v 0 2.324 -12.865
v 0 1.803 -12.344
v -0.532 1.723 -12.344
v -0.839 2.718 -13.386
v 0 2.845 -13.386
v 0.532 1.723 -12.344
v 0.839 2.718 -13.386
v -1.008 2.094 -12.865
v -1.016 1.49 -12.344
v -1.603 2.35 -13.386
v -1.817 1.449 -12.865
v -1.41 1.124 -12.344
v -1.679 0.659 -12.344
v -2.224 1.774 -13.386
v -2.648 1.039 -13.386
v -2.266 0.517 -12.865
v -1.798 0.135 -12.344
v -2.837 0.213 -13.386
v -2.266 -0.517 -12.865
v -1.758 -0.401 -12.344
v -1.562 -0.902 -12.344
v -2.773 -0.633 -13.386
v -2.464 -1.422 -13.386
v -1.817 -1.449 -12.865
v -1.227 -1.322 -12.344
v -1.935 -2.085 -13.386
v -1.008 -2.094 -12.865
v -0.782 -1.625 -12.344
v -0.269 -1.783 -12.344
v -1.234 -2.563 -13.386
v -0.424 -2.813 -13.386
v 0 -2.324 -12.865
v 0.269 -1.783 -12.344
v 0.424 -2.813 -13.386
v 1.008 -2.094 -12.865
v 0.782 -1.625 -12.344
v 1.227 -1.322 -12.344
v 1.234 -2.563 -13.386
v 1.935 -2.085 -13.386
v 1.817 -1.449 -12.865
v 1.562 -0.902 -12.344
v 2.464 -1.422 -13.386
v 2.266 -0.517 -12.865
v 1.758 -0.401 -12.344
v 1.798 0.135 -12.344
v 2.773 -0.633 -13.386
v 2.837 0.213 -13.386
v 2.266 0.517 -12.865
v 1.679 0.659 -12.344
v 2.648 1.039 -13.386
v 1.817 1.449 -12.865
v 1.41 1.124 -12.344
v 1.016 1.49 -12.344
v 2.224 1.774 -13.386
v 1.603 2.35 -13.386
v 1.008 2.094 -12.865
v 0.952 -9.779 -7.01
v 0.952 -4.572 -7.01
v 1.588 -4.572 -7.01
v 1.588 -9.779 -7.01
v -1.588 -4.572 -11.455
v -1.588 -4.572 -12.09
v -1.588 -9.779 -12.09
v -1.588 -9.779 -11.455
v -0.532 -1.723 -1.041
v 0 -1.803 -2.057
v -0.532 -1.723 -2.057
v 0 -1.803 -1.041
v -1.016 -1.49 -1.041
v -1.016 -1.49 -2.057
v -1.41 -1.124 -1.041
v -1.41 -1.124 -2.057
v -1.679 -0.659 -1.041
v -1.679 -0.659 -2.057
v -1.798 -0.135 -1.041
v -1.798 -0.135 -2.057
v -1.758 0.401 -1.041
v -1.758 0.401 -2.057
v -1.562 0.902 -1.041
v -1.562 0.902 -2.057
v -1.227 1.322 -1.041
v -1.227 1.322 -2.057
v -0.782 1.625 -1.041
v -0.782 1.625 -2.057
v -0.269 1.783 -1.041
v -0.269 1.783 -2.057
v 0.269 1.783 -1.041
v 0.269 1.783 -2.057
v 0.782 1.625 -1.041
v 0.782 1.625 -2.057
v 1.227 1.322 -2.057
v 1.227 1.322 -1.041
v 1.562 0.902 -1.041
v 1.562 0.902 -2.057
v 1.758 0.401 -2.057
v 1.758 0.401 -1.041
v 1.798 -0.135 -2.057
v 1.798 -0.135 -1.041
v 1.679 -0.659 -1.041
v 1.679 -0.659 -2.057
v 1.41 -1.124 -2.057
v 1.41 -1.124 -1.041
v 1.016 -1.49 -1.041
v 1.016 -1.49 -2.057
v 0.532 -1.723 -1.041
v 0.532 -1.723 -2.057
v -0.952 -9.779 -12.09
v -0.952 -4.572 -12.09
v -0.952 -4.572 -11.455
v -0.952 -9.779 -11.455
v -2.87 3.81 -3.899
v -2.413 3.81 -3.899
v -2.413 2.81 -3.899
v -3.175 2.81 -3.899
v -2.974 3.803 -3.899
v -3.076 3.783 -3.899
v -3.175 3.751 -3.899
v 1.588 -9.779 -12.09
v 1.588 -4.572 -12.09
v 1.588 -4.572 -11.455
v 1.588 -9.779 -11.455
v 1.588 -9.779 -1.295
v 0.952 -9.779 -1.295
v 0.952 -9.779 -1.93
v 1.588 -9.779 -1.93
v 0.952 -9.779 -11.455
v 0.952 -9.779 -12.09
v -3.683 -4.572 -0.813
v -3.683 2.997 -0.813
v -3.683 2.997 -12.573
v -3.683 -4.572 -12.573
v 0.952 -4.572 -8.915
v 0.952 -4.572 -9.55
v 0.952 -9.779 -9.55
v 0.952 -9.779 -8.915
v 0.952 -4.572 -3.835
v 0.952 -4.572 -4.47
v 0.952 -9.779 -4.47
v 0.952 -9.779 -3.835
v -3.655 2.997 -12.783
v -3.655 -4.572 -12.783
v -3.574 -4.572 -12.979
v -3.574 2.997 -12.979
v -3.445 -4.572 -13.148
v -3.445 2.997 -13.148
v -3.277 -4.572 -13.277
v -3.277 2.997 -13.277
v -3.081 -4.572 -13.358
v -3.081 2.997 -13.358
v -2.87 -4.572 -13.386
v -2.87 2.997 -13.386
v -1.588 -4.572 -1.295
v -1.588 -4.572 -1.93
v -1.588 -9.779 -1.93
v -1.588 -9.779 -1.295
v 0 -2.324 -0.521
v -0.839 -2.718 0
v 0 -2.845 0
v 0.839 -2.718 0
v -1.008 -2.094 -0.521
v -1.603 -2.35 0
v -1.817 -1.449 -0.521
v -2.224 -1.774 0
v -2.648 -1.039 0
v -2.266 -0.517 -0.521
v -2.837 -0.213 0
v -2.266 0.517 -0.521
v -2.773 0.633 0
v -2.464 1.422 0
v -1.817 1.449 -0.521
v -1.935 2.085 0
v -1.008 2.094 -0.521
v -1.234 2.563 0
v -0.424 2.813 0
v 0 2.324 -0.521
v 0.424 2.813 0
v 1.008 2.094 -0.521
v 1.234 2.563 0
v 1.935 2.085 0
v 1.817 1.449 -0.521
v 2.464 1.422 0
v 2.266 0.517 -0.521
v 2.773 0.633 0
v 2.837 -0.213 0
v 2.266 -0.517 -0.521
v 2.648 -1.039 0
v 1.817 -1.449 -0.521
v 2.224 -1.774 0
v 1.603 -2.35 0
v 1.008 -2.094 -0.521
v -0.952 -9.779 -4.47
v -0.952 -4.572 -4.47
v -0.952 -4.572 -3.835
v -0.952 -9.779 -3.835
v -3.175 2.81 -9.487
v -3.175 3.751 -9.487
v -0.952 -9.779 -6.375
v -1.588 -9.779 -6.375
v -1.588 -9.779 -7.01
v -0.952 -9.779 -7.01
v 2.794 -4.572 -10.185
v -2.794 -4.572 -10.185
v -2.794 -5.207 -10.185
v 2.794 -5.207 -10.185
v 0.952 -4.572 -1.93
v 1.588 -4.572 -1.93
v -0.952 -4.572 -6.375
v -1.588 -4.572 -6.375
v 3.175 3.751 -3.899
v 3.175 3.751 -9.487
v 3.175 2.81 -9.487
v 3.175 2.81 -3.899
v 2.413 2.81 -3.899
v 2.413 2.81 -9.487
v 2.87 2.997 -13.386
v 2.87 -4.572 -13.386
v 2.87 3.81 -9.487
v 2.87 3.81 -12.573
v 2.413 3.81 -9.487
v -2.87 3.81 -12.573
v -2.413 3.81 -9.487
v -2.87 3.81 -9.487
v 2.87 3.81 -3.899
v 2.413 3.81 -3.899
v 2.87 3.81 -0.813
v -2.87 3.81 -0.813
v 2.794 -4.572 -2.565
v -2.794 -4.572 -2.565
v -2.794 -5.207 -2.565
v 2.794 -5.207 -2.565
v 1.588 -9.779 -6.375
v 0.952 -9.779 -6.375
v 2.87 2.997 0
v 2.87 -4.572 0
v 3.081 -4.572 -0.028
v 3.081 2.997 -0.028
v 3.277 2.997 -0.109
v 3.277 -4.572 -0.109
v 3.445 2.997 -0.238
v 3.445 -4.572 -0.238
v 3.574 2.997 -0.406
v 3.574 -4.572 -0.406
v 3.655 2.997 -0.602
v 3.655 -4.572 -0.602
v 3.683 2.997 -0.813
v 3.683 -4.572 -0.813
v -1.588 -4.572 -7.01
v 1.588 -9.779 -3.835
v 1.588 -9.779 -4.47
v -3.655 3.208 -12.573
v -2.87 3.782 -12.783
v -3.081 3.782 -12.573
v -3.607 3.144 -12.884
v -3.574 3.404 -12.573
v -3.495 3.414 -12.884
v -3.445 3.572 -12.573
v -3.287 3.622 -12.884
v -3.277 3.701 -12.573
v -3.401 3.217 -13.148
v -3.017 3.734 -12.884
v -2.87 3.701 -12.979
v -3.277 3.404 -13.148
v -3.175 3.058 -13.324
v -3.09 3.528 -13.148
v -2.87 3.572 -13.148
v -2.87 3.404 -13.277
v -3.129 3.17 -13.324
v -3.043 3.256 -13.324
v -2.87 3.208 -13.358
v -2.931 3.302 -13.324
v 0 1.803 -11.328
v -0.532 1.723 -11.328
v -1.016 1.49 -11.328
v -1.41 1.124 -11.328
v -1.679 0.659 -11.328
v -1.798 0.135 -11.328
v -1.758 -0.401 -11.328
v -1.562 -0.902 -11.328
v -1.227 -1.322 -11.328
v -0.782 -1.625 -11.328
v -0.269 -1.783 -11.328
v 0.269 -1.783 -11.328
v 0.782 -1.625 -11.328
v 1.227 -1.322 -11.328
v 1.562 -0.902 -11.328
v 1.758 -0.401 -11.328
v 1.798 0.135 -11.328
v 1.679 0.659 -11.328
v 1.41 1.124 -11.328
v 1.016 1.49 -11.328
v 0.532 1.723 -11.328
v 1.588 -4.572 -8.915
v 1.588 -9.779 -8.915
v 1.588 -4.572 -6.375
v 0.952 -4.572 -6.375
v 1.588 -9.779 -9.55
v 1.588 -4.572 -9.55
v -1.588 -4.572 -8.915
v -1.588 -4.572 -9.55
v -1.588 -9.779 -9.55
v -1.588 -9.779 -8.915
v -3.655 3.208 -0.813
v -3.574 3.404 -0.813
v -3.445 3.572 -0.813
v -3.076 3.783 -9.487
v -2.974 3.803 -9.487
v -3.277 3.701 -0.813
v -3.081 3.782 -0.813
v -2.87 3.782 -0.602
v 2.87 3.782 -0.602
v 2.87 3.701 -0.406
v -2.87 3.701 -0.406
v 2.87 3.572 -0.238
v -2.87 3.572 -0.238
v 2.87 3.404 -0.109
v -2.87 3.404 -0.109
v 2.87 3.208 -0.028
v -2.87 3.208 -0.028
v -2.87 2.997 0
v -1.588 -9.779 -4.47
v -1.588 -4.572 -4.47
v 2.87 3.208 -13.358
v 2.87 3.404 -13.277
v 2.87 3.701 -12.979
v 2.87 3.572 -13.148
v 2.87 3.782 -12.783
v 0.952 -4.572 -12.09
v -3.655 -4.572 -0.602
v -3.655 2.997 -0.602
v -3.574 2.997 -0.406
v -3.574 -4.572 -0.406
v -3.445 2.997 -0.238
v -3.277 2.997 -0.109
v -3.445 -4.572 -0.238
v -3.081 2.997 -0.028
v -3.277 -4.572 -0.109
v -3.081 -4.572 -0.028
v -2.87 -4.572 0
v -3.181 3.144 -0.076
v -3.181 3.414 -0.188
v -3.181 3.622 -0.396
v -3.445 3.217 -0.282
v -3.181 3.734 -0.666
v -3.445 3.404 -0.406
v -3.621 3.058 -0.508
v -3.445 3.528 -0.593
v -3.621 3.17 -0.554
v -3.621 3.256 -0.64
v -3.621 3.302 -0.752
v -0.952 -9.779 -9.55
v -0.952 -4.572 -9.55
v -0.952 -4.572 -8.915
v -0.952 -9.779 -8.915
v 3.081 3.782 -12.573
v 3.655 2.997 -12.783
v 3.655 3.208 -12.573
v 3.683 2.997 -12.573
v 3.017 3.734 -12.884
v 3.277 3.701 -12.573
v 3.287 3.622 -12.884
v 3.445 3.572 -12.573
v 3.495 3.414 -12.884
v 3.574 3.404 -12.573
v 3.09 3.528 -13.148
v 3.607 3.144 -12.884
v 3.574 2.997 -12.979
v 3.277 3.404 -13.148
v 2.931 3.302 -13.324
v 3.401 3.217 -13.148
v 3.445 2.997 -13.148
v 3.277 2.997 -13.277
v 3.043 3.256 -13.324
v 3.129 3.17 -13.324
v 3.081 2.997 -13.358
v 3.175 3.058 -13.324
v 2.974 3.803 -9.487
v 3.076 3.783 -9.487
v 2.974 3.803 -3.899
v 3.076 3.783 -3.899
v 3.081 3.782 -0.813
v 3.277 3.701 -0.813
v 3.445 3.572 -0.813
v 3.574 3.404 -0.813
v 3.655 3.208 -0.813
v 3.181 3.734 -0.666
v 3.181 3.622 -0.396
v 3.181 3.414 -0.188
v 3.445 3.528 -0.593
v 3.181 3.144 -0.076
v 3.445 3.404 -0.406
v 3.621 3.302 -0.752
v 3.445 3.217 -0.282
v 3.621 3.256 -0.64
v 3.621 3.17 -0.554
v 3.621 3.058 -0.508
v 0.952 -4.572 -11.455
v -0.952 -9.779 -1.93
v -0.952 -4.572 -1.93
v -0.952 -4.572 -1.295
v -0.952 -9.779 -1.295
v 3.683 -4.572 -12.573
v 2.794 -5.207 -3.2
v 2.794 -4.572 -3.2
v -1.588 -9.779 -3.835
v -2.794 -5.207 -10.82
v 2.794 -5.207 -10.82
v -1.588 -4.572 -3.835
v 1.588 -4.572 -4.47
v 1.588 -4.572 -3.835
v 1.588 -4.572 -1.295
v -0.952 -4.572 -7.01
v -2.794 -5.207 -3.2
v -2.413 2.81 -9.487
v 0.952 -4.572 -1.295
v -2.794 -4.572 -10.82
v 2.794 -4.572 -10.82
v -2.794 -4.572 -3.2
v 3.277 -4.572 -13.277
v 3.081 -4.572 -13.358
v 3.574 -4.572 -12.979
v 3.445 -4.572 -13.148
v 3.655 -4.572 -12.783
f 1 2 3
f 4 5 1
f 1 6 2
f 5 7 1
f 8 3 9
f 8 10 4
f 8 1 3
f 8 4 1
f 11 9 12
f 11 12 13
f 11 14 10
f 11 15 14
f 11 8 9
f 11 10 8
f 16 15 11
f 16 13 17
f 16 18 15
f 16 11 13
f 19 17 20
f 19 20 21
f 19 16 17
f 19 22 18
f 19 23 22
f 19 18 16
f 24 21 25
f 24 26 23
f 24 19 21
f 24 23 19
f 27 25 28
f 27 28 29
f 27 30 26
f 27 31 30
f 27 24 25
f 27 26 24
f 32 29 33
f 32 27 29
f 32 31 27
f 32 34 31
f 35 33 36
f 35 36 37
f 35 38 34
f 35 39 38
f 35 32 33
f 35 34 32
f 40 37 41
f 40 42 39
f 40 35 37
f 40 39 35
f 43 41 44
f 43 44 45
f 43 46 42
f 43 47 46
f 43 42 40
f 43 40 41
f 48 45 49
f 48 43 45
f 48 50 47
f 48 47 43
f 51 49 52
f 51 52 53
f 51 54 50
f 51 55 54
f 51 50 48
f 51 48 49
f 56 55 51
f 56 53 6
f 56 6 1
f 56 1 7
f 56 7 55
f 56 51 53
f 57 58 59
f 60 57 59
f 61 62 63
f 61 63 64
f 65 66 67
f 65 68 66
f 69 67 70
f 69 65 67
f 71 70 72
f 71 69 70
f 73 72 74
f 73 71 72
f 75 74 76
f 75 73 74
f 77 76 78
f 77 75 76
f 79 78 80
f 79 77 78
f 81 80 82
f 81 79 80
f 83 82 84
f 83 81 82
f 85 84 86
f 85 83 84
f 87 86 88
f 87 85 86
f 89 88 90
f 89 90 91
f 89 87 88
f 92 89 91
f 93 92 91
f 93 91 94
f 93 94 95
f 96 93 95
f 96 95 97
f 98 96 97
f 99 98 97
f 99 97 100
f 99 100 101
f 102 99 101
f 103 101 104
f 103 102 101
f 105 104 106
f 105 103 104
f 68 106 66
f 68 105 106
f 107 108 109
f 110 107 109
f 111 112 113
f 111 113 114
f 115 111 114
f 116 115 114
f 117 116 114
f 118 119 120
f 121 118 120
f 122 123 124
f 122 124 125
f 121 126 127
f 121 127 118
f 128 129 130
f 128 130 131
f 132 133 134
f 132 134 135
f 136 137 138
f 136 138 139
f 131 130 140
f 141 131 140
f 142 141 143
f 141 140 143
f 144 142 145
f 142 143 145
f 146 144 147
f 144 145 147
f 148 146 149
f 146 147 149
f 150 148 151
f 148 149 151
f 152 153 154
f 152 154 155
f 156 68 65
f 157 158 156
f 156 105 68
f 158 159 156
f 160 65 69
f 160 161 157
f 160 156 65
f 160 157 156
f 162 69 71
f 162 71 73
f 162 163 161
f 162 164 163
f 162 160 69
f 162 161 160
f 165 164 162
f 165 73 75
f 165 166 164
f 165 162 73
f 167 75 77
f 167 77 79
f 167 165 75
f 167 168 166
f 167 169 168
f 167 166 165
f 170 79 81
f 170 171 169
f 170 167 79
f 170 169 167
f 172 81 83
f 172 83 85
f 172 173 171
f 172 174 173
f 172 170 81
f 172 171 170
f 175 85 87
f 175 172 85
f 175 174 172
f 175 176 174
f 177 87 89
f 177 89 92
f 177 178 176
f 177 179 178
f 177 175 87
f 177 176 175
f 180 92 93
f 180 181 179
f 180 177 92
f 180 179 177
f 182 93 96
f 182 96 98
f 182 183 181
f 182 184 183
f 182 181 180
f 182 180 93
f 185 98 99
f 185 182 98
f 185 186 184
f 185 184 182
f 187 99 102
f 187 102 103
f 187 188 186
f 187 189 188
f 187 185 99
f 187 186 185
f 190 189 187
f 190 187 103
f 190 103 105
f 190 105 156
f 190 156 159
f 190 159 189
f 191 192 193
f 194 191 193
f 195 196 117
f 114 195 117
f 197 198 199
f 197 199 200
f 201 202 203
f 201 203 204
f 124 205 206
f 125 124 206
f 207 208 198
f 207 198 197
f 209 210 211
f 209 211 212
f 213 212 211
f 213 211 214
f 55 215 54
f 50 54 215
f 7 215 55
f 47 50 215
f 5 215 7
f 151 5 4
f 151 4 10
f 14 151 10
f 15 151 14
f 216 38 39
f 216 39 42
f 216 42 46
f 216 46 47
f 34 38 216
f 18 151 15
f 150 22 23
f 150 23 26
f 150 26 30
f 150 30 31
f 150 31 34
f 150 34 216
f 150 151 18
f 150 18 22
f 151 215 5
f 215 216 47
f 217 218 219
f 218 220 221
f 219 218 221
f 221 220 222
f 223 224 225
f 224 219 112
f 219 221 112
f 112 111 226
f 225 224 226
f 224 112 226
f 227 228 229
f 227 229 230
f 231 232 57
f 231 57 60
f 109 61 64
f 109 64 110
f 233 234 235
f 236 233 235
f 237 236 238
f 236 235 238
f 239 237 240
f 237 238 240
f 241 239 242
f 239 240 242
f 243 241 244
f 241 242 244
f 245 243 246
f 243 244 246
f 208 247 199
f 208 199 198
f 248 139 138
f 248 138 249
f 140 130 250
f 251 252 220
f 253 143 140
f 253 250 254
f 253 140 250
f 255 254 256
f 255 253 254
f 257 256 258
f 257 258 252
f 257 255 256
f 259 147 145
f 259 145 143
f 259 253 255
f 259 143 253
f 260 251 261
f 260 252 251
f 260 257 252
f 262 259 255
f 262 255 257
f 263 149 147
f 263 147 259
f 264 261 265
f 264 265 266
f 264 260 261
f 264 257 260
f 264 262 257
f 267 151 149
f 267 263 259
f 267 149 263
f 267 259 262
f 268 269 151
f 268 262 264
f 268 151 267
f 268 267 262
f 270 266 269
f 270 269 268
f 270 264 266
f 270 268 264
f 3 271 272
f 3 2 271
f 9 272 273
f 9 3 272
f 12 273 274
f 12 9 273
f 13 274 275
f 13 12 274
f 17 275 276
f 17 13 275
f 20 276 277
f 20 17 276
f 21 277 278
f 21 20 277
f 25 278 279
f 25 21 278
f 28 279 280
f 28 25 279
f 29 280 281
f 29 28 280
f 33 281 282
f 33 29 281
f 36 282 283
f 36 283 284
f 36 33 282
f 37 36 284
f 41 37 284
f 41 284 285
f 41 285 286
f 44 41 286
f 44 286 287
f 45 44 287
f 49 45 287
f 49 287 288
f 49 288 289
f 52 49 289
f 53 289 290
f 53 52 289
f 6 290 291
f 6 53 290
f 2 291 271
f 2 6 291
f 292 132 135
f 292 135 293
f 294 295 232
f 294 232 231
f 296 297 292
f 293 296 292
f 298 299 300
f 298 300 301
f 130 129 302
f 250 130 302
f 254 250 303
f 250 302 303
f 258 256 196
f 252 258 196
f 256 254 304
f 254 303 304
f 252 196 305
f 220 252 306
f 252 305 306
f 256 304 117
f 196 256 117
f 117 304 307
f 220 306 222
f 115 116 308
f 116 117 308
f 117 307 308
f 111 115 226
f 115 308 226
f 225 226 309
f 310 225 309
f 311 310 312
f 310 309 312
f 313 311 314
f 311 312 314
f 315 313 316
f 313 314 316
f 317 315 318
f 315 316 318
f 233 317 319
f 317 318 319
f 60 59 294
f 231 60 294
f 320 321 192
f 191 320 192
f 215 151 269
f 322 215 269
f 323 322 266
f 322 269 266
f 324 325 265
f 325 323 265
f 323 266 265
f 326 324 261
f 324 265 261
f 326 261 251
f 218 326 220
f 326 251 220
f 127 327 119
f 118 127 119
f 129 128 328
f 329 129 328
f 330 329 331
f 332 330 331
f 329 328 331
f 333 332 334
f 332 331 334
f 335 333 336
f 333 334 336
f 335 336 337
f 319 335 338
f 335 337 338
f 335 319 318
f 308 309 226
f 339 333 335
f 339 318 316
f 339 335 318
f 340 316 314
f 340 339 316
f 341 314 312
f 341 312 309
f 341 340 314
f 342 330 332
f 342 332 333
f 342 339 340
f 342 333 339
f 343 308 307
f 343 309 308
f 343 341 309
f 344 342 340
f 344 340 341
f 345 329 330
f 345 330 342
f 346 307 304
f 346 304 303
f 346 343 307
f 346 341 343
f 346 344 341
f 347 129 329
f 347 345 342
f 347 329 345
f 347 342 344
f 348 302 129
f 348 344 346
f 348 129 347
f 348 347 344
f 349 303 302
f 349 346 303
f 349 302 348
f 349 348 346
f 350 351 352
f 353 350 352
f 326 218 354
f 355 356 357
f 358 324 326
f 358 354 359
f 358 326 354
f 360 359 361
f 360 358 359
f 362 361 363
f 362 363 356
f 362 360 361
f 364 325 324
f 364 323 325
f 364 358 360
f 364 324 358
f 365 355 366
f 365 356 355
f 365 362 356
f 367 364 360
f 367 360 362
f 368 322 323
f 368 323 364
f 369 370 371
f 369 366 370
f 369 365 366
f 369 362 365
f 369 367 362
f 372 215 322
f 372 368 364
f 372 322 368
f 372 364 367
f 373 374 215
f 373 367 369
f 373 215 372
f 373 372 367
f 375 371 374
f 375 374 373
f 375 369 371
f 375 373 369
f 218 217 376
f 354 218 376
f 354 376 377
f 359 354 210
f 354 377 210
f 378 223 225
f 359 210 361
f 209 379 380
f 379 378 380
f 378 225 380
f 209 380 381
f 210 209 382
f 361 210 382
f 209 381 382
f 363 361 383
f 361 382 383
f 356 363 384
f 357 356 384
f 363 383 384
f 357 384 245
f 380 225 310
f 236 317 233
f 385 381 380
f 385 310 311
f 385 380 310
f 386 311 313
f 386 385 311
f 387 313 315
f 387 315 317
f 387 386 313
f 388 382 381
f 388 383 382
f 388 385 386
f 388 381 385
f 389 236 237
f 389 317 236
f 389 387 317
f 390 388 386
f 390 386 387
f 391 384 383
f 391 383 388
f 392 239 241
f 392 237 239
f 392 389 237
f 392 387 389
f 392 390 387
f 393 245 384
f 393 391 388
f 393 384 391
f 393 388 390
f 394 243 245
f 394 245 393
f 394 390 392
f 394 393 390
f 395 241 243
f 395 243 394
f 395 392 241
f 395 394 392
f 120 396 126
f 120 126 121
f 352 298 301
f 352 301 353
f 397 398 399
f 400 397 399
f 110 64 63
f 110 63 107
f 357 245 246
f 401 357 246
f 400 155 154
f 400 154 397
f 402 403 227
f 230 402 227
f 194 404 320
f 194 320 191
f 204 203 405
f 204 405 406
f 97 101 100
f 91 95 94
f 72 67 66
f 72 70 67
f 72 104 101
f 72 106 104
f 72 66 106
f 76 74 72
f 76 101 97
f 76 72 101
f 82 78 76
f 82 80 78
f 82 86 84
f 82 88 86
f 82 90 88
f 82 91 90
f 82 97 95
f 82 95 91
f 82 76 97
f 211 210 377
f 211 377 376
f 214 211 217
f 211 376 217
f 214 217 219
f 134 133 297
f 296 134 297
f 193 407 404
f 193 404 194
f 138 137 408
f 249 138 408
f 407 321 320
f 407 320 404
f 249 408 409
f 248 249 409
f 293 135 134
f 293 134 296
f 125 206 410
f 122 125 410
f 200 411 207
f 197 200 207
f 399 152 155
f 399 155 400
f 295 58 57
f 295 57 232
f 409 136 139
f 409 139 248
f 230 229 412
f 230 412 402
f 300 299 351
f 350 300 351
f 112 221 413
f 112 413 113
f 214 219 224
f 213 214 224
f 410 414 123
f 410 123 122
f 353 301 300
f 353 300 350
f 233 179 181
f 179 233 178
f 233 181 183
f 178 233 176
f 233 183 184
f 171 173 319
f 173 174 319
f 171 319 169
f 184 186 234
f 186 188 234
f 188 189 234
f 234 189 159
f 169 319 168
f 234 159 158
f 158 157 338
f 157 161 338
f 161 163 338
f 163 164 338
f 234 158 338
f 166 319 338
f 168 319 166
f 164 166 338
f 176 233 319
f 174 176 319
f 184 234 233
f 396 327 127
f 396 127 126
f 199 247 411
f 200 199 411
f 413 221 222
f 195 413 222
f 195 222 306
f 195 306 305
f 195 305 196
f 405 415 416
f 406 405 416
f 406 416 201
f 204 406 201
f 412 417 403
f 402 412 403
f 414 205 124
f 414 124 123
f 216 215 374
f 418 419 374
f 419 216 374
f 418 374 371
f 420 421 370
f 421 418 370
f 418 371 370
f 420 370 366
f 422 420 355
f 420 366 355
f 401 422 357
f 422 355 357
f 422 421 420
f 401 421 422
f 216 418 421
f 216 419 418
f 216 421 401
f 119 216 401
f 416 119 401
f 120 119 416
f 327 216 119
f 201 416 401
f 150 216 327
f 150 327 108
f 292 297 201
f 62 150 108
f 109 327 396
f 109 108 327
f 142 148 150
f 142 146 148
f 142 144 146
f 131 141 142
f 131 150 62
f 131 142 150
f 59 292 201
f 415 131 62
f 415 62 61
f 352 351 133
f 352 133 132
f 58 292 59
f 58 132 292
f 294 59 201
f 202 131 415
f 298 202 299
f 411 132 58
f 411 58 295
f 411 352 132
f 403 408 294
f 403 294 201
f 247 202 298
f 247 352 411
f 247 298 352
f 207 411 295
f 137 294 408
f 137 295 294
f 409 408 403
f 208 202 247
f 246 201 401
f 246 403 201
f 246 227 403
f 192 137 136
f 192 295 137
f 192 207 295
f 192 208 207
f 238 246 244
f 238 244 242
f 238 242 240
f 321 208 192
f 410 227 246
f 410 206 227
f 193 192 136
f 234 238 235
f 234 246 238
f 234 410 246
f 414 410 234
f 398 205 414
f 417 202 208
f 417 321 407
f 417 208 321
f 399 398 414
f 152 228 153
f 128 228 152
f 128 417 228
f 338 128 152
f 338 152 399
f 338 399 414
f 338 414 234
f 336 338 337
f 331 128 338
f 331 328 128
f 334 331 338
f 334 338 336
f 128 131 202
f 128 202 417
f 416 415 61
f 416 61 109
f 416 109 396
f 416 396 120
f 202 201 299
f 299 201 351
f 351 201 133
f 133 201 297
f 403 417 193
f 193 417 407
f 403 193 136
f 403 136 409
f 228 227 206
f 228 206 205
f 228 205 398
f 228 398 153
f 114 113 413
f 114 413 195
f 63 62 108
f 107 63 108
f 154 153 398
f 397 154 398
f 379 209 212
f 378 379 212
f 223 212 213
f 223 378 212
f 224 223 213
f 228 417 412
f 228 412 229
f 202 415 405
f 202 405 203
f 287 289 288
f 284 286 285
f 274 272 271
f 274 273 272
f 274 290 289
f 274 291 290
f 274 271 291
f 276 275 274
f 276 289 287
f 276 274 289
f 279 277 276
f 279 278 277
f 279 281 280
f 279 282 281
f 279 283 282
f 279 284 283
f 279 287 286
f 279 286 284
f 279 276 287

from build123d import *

# Parameters (mm, degrees)
SKETCH1_W            = 8.382
SKETCH1_H            = 13.3858
BOSS_EXTRUDE1_DEPTH  = 7.366
SKETCH2_W            = 5.588
SKETCH2_H            = 0.635
BOSS_EXTRUDE2_DEPTH  = 0.635
SKETCH3_W            = 5.588
SKETCH3_H            = 0.635
BOSS_EXTRUDE3_DEPTH  = 0.635
SKETCH4_W            = 0.635
SKETCH4_H            = 0.635
BOSS_EXTRUDE4_DEPTH  = 5.207
SKETCH5_W            = 0.635
SKETCH5_H            = 0.635
BOSS_EXTRUDE5_DEPTH  = 5.207
SKETCH6_W            = 0.635
SKETCH6_H            = 0.635
BOSS_EXTRUDE6_DEPTH  = 5.207
SKETCH7_W            = 0.635
SKETCH7_H            = 0.635
BOSS_EXTRUDE7_DEPTH  = 5.207
SKETCH8_W            = 0.635
SKETCH8_H            = 0.635
BOSS_EXTRUDE8_DEPTH  = 5.207
SKETCH9_W            = 0.635
SKETCH9_H            = 0.635
BOSS_EXTRUDE9_DEPTH  = 5.207
SKETCH10_W           = 0.635
SKETCH10_H           = 0.635
BOSS_EXTRUDE10_DEPTH = 5.207
SKETCH11_W           = 0.635
SKETCH11_H           = 0.635
BOSS_EXTRUDE11_DEPTH = 5.207
SKETCH12_W           = 0.635
SKETCH12_H           = 0.635
BOSS_EXTRUDE12_DEPTH = 5.207
SKETCH13_W           = 0.635
SKETCH13_H           = 0.635
BOSS_EXTRUDE13_DEPTH = 5.207
SKETCH14_W           = 0.762
SKETCH14_H           = 5.588
CUT_EXTRUDE1_DEPTH   = 0.999998
SKETCH15_W           = 0.762
SKETCH15_H           = 5.588
CUT_EXTRUDE2_DEPTH   = 0.999998
FILLET1_R            = 0.8128


with BuildPart() as part:
    # Sketch1 → Boss-Extrude1 (new body)
    with BuildSketch(Plane(origin=(-3.683, 0, 0), x_dir=(0, -1, 0), z_dir=(-1, 0, 0))):
        with Locations((0.381, -6.6929)):
            Rectangle(SKETCH1_W, SKETCH1_H)
    extrude(amount=-BOSS_EXTRUDE1_DEPTH)

    # Sketch2 → Boss-Extrude2 (add)
    with BuildSketch(Plane.XZ.offset(4.572)):
        with Locations((0, -2.8829)):
            Rectangle(SKETCH2_W, SKETCH2_H)
    extrude(amount=BOSS_EXTRUDE2_DEPTH)

    # Sketch3 → Boss-Extrude3 (add)
    with BuildSketch(Plane.XZ.offset(4.572)):
        with Locations((0, -10.5029)):
            Rectangle(SKETCH3_W, SKETCH3_H)
    extrude(amount=BOSS_EXTRUDE3_DEPTH)

    # Sketch4 → Boss-Extrude4 (add)
    with BuildSketch(Plane.XZ.offset(4.572)):
        with Locations((1.27, -11.7729)):
            Rectangle(SKETCH4_W, SKETCH4_H)
    extrude(amount=BOSS_EXTRUDE4_DEPTH)

    # Sketch5 → Boss-Extrude5 (add)
    with BuildSketch(Plane.XZ.offset(4.572)):
        with Locations((-1.27, -11.7729)):
            Rectangle(SKETCH5_W, SKETCH5_H)
    extrude(amount=BOSS_EXTRUDE5_DEPTH)

    # Sketch6 → Boss-Extrude6 (add)
    with BuildSketch(Plane.XZ.offset(4.572)):
        with Locations((1.27, -9.2329)):
            Rectangle(SKETCH6_W, SKETCH6_H)
    extrude(amount=BOSS_EXTRUDE6_DEPTH)

    # Sketch7 → Boss-Extrude7 (add)
    with BuildSketch(Plane.XZ.offset(4.572)):
        with Locations((-1.27, -9.2329)):
            Rectangle(SKETCH7_W, SKETCH7_H)
    extrude(amount=BOSS_EXTRUDE7_DEPTH)

    # Sketch8 → Boss-Extrude8 (add)
    with BuildSketch(Plane.XZ.offset(4.572)):
        with Locations((1.27, -6.6929)):
            Rectangle(SKETCH8_W, SKETCH8_H)
    extrude(amount=BOSS_EXTRUDE8_DEPTH)

    # Sketch9 → Boss-Extrude9 (add)
    with BuildSketch(Plane.XZ.offset(4.572)):
        with Locations((-1.27, -6.6929)):
            Rectangle(SKETCH9_W, SKETCH9_H)
    extrude(amount=BOSS_EXTRUDE9_DEPTH)

    # Sketch10 → Boss-Extrude10 (add)
    with BuildSketch(Plane.XZ.offset(4.572)):
        with Locations((1.27, -4.1529)):
            Rectangle(SKETCH10_W, SKETCH10_H)
    extrude(amount=BOSS_EXTRUDE10_DEPTH)

    # Sketch11 → Boss-Extrude11 (add)
    with BuildSketch(Plane.XZ.offset(4.572)):
        with Locations((-1.27, -4.1529)):
            Rectangle(SKETCH11_W, SKETCH11_H)
    extrude(amount=BOSS_EXTRUDE11_DEPTH)

    # Sketch12 → Boss-Extrude12 (add)
    with BuildSketch(Plane.XZ.offset(4.572)):
        with Locations((1.27, -1.6129)):
            Rectangle(SKETCH12_W, SKETCH12_H)
    extrude(amount=BOSS_EXTRUDE12_DEPTH)

    # Sketch13 → Boss-Extrude13 (add)
    with BuildSketch(Plane.XZ.offset(4.572)):
        with Locations((-1.27, -1.6129)):
            Rectangle(SKETCH13_W, SKETCH13_H)
    extrude(amount=BOSS_EXTRUDE13_DEPTH)

    # Sketch14 → Cut-Extrude1 (cut)
    with BuildSketch(Plane(origin=(0, 3.81, 0), x_dir=(-1, 0, 0), z_dir=(0, 1, 0))):
        with Locations((2.794, -6.6929)):
            Rectangle(SKETCH14_W, SKETCH14_H)
    extrude(amount=-CUT_EXTRUDE1_DEPTH, mode=Mode.SUBTRACT)

    # Sketch15 → Cut-Extrude2 (cut)
    with BuildSketch(Plane(origin=(0, 3.81, 0), x_dir=(-1, 0, 0), z_dir=(0, 1, 0))):
        with Locations((-2.794, -6.6929)):
            Rectangle(SKETCH15_W, SKETCH15_H)
    extrude(amount=-CUT_EXTRUDE2_DEPTH, mode=Mode.SUBTRACT)

    # Sketch16 → Hole1 (revolve, cut)
    with BuildSketch(Plane(origin=(0, 0, 0), x_dir=(0, -1, 0), z_dir=(1, 0, 0))):
        Polygon((0, 0), (0, 2.0574), (1.8034, 2.0574), (1.8034, 1.0414), (2.8448, 0), align=None)
    revolve(axis=Axis((0, 0, 6.445314094), (0, 0, -1)), mode=Mode.SUBTRACT)

    # Sketch18 → Hole2 (revolve, cut)
    with BuildSketch(Plane(origin=(0, 0, -13.3858), x_dir=(0, 1, 0), z_dir=(1, 0, 0))):
        Polygon((0, 0), (0, 2.0574), (1.8034, 2.0574), (1.8034, 1.0414), (2.8448, 0), align=None)
    revolve(axis=Axis((0, 0, -19.831114094), (0, 0, 1)), mode=Mode.SUBTRACT)

    # Fillet1
    # the kernel refuses this fillet: 0.8128 mm, written as the material it takes off along each edge
    with BuildSketch(Plane(origin=(-2.8702, 2.9972, -12.573), x_dir=(-1, 0, 0), z_dir=(0, 0, -1))) as fillet1_piece_1_section:
        Polygon((0, 0), (FILLET1_R, 0), (FILLET1_R, FILLET1_R), (0, FILLET1_R), align=None)
    fillet1_piece_1 = extrude(amount=FILLET1_R, mode=Mode.PRIVATE)
    fillet1_piece_1 = fillet1_piece_1 - Plane(origin=(-2.8702, 2.9972, -12.573), x_dir=(0.7071067811865475, -0.7071067811865475, 0), z_dir=(0, 0, -1)) * Sphere(FILLET1_R, mode=Mode.PRIVATE)
    add(fillet1_piece_1, mode=Mode.SUBTRACT)
    with BuildSketch(Plane(origin=(2.8702, 2.9972, -12.573), x_dir=(1, 0, 0), z_dir=(0, 0, -1))) as fillet1_piece_2_section:
        Polygon((0, 0), (FILLET1_R, 0), (FILLET1_R, -FILLET1_R), (0, -FILLET1_R), align=None)
    fillet1_piece_2 = extrude(amount=FILLET1_R, mode=Mode.PRIVATE)
    fillet1_piece_2 = fillet1_piece_2 - Plane(origin=(2.8702, 2.9972, -12.573), x_dir=(-0.7071067811865475, -0.7071067811865475, 0), z_dir=(0, 0, -1)) * Sphere(FILLET1_R, mode=Mode.PRIVATE)
    add(fillet1_piece_2, mode=Mode.SUBTRACT)
    with BuildSketch(Plane(origin=(-2.8702, 2.9972, -0.8128), x_dir=(0, 0, 1), z_dir=(-1, 0, 0))) as fillet1_piece_3_section:
        Polygon((0, 0), (FILLET1_R, 0), (FILLET1_R, FILLET1_R), (0, FILLET1_R), align=None)
    fillet1_piece_3 = extrude(amount=FILLET1_R, mode=Mode.PRIVATE)
    fillet1_piece_3 = fillet1_piece_3 - Plane(origin=(-2.8702, 2.9972, -0.8128), x_dir=(0, -0.7071067811865475, -0.7071067811865475), z_dir=(-1, 0, 0)) * Sphere(FILLET1_R, mode=Mode.PRIVATE)
    add(fillet1_piece_3, mode=Mode.SUBTRACT)
    with BuildSketch(Plane(origin=(2.8702, 2.9972, -0.8128), x_dir=(0, 0, 1), z_dir=(1, 0, 0))) as fillet1_piece_4_section:
        Polygon((0, 0), (FILLET1_R, 0), (FILLET1_R, -FILLET1_R), (0, -FILLET1_R), align=None)
    fillet1_piece_4 = extrude(amount=FILLET1_R, mode=Mode.PRIVATE)
    fillet1_piece_4 = fillet1_piece_4 - Plane(origin=(2.8702, 2.9972, -0.8128), x_dir=(0, -0.7071067811865475, -0.7071067811865475), z_dir=(1, 0, 0)) * Sphere(FILLET1_R, mode=Mode.PRIVATE)
    add(fillet1_piece_4, mode=Mode.SUBTRACT)
    with BuildSketch(Plane(origin=(-3.683, 2.9972, -13.3858), x_dir=(1, 0, 0), z_dir=(0, -1, 0)), Plane(origin=(3.683, -6.604, 0), x_dir=(0, 0, -1), z_dir=(0, 1, 0))) as fillet1_piece_5:
        with BuildLine():
            CenterArc((FILLET1_R, FILLET1_R), FILLET1_R, 180, 90)
            Line((0, FILLET1_R), (0, 0))
            Line((0, 0), (FILLET1_R, 0))
        make_face()
    extrude(amount=9.6012, mode=Mode.SUBTRACT)
    with BuildSketch(Plane(origin=(-2.8702, 3.81, -13.3858), x_dir=(0, -1, 0), z_dir=(1, 0, 0))) as fillet1_piece_6:
        with BuildLine():
            CenterArc((FILLET1_R, -FILLET1_R), FILLET1_R, 90, 90)
            Line((0, -FILLET1_R), (0, 0))
            Line((0, 0), (FILLET1_R, 0))
        make_face()
    extrude(amount=5.7404, mode=Mode.SUBTRACT)
    with BuildSketch(Plane(origin=(3.683, 2.9972, -13.3858), x_dir=(-1, 0, 0), z_dir=(0, -1, 0)), Plane(origin=(-3.683, -6.604, 0), x_dir=(0, 0, -1), z_dir=(0, 1, 0))) as fillet1_piece_7:
        with BuildLine():
            CenterArc((FILLET1_R, -FILLET1_R), FILLET1_R, 90, 90)
            Line((0, -FILLET1_R), (0, 0))
            Line((0, 0), (FILLET1_R, 0))
        make_face()
    extrude(amount=9.6012, mode=Mode.SUBTRACT)
    with BuildSketch(Plane(origin=(-3.683, 3.81, -0.8128), x_dir=(0, -1, 0), z_dir=(0, 0, -1))) as fillet1_piece_8:
        with BuildLine():
            CenterArc((FILLET1_R, -FILLET1_R), FILLET1_R, 90, 90)
            Line((0, -FILLET1_R), (0, 0))
            Line((0, 0), (FILLET1_R, 0))
        make_face()
    extrude(amount=11.7602, mode=Mode.SUBTRACT)
    with BuildSketch(Plane(origin=(3.683, 3.81, -0.8128), x_dir=(0, -1, 0), z_dir=(0, 0, -1))) as fillet1_piece_9:
        with BuildLine():
            CenterArc((FILLET1_R, FILLET1_R), FILLET1_R, 180, 90)
            Line((0, FILLET1_R), (0, 0))
            Line((0, 0), (FILLET1_R, 0))
        make_face()
    extrude(amount=11.7602, mode=Mode.SUBTRACT)
    with BuildSketch(Plane(origin=(-2.8702, 3.81, 0), x_dir=(0, -1, 0), z_dir=(1, 0, 0))) as fillet1_piece_10:
        with BuildLine():
            CenterArc((FILLET1_R, FILLET1_R), FILLET1_R, 180, 90)
            Line((0, FILLET1_R), (0, 0))
            Line((0, 0), (FILLET1_R, 0))
        make_face()
    extrude(amount=5.7404, mode=Mode.SUBTRACT)


solid = part.part
